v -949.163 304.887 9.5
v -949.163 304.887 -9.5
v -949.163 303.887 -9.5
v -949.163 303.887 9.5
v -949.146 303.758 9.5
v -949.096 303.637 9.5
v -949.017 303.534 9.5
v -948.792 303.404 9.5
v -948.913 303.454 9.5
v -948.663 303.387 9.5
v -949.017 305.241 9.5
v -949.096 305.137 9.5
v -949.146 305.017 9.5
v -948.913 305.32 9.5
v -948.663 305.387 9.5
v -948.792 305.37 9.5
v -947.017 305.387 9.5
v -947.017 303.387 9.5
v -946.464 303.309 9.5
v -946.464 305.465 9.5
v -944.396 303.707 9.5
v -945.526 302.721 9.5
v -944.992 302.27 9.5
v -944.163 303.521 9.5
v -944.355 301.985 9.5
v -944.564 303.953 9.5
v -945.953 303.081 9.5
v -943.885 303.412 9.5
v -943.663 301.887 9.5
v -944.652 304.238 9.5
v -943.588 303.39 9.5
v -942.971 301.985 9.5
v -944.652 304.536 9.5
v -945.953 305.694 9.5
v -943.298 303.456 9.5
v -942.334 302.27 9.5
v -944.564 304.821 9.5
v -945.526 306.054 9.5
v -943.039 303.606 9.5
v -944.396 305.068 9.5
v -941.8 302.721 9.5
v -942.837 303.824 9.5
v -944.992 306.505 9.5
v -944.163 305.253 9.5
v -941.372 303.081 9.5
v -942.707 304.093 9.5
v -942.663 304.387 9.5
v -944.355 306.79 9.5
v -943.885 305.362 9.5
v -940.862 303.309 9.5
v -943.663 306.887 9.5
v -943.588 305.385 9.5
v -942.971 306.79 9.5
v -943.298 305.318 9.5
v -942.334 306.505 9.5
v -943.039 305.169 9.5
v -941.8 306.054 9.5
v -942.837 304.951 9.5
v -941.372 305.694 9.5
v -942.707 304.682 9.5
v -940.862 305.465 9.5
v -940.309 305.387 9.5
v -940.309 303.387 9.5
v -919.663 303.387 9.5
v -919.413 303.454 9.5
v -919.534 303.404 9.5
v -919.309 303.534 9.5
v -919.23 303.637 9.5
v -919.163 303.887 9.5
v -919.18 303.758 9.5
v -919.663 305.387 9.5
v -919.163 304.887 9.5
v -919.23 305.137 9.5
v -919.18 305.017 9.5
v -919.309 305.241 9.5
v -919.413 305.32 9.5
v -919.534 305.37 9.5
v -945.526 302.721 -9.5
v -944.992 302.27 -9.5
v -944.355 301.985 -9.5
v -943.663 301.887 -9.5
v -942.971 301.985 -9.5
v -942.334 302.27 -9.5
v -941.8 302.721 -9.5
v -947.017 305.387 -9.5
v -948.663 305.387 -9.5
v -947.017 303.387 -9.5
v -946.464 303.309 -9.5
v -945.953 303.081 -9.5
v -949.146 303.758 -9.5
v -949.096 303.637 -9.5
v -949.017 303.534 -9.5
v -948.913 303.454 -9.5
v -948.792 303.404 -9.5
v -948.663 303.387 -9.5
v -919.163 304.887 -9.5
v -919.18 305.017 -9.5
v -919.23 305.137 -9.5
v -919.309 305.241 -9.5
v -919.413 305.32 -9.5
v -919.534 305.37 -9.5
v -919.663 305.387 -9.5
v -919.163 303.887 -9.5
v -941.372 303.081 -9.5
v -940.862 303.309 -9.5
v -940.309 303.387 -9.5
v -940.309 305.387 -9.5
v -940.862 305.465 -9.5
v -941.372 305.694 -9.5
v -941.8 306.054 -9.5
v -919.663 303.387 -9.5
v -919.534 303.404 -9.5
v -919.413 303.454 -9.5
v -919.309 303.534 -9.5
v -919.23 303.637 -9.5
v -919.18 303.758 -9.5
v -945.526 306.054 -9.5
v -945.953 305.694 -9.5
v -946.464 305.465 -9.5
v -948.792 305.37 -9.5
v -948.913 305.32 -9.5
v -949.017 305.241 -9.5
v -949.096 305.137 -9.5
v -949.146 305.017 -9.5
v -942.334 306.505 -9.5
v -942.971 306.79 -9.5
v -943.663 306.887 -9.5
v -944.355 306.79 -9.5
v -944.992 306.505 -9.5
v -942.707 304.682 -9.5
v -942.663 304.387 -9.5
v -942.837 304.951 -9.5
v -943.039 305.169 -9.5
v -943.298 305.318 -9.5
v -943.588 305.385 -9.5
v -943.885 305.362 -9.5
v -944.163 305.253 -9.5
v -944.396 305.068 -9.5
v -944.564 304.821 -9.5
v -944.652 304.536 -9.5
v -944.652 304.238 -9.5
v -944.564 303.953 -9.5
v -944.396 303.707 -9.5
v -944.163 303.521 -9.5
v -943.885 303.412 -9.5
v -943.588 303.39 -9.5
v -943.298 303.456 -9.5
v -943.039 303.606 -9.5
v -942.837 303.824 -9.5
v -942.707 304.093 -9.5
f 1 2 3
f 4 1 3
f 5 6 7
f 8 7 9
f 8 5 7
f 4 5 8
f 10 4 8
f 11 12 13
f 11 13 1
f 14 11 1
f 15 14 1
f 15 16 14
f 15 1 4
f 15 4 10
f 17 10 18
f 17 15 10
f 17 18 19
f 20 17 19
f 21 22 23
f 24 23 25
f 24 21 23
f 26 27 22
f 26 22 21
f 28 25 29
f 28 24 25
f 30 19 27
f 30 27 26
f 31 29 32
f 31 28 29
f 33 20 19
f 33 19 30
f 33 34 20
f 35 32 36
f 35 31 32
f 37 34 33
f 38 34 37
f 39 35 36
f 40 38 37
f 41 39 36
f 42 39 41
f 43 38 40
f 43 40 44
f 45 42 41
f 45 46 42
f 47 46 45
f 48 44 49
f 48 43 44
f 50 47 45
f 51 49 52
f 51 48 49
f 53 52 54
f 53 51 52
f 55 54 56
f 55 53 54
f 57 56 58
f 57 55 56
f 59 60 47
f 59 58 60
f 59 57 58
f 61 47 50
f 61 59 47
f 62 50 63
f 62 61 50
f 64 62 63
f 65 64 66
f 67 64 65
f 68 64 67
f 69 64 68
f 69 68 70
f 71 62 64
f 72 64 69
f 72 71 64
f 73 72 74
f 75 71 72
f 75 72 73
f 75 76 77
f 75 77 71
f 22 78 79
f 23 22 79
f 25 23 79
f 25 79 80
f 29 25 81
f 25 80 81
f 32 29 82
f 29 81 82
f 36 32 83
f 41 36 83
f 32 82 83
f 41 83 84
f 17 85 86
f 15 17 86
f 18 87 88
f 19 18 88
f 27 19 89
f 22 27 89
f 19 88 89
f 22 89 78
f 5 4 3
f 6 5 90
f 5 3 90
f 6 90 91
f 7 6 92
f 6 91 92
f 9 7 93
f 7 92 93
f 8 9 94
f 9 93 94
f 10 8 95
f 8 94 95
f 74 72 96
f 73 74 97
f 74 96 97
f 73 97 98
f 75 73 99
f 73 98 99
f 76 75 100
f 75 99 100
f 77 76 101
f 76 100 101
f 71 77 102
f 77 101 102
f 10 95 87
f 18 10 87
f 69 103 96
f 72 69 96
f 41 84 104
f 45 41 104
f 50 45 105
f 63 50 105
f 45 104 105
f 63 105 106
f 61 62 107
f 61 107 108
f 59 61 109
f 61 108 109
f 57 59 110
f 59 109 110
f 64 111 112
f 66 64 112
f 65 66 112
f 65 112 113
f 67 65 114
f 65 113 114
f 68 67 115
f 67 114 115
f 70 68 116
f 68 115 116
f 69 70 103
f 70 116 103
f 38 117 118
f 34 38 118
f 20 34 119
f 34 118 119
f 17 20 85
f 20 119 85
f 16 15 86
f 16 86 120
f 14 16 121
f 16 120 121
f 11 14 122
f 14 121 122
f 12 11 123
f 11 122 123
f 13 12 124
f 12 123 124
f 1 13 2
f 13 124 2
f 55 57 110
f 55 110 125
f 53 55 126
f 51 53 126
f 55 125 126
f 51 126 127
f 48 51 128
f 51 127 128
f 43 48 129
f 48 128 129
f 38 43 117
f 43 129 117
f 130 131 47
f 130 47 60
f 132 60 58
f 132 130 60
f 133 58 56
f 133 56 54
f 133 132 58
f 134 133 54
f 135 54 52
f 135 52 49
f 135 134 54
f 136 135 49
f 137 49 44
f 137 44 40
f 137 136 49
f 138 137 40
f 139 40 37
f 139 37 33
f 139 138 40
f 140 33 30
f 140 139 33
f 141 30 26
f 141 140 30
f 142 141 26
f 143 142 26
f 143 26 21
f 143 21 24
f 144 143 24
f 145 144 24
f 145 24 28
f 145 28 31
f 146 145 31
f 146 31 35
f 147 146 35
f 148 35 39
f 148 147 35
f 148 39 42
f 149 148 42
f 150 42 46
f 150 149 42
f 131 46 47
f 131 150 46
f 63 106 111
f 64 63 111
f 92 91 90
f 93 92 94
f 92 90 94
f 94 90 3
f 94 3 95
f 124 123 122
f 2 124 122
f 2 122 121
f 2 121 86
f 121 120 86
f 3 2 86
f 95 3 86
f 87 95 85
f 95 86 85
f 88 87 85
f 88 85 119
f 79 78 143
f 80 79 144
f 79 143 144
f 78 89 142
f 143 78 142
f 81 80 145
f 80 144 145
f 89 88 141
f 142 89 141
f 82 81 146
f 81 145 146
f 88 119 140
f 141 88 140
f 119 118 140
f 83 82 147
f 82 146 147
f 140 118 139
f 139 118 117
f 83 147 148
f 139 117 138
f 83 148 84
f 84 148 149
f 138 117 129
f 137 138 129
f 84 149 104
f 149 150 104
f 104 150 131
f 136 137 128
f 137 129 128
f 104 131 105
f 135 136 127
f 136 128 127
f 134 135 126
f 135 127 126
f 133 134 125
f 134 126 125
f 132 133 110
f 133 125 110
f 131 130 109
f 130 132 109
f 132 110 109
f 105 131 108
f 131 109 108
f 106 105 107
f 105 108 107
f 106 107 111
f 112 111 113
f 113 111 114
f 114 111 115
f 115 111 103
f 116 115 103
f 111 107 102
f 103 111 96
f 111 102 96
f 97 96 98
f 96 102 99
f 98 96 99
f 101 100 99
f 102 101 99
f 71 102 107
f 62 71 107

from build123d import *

# Parameters (mm, degrees)
BOSS_EXTRUDE1_DEPTH      = 9.5
BOSS_EXTRUDE1_DEPTH_BACK = 9.5
SKETCH1_R                = 1


with BuildPart() as part:
    # Sketch1 → Boss-Extrude1 (new, two sides: drawn at the far end of the back side and taken through both)
    with BuildSketch(Plane.XY.offset(-BOSS_EXTRUDE1_DEPTH_BACK)):
        with BuildLine():
            Line((-948.662974387, 303.387338025), (-947.017076353, 303.387338025))
            ThreePointArc((-947.017076353, 303.387338025), (-946.200579773, 303.213079884), (-945.526364368, 302.720671359))
            ThreePointArc((-945.526364368, 302.720671359), (-943.662974387, 301.887338025), (-941.799584406, 302.720671359))
            ThreePointArc((-941.799584406, 302.720671359), (-941.125369002, 303.213079884), (-940.308872421, 303.387338025))
            Line((-940.308872421, 303.387338025), (-919.662974387, 303.387338025))
            ThreePointArc((-919.662974387, 303.387338025), (-919.309420997, 303.533784635), (-919.162974387, 303.887338025))
            Line((-919.162974387, 303.887338025), (-919.162974387, 304.887338025))
            ThreePointArc((-919.162974387, 304.887338025), (-919.309420997, 305.240891416), (-919.662974387, 305.387338025))
            Line((-919.662974387, 305.387338025), (-940.308872421, 305.387338025))
            ThreePointArc((-940.308872421, 305.387338025), (-941.125369002, 305.561596167), (-941.799584406, 306.054004692))
            ThreePointArc((-941.799584406, 306.054004692), (-943.662974387, 306.887338025), (-945.526364368, 306.054004692))
            ThreePointArc((-945.526364368, 306.054004692), (-946.200579773, 305.561596167), (-947.017076353, 305.387338025))
            Line((-947.017076353, 305.387338025), (-948.662974387, 305.387338025))
            ThreePointArc((-948.662974387, 305.387338025), (-949.016527778, 305.240891416), (-949.162974387, 304.887338025))
            Line((-949.162974387, 304.887338025), (-949.162974387, 303.887338025))
            ThreePointArc((-949.162974387, 303.887338025), (-949.016527778, 303.533784635), (-948.662974387, 303.387338025))
        make_face()
        with Locations((-943.662974387, 304.387338025)):
            Circle(SKETCH1_R, mode=Mode.SUBTRACT)
    extrude(amount=BOSS_EXTRUDE1_DEPTH + BOSS_EXTRUDE1_DEPTH_BACK)


solid = part.part
